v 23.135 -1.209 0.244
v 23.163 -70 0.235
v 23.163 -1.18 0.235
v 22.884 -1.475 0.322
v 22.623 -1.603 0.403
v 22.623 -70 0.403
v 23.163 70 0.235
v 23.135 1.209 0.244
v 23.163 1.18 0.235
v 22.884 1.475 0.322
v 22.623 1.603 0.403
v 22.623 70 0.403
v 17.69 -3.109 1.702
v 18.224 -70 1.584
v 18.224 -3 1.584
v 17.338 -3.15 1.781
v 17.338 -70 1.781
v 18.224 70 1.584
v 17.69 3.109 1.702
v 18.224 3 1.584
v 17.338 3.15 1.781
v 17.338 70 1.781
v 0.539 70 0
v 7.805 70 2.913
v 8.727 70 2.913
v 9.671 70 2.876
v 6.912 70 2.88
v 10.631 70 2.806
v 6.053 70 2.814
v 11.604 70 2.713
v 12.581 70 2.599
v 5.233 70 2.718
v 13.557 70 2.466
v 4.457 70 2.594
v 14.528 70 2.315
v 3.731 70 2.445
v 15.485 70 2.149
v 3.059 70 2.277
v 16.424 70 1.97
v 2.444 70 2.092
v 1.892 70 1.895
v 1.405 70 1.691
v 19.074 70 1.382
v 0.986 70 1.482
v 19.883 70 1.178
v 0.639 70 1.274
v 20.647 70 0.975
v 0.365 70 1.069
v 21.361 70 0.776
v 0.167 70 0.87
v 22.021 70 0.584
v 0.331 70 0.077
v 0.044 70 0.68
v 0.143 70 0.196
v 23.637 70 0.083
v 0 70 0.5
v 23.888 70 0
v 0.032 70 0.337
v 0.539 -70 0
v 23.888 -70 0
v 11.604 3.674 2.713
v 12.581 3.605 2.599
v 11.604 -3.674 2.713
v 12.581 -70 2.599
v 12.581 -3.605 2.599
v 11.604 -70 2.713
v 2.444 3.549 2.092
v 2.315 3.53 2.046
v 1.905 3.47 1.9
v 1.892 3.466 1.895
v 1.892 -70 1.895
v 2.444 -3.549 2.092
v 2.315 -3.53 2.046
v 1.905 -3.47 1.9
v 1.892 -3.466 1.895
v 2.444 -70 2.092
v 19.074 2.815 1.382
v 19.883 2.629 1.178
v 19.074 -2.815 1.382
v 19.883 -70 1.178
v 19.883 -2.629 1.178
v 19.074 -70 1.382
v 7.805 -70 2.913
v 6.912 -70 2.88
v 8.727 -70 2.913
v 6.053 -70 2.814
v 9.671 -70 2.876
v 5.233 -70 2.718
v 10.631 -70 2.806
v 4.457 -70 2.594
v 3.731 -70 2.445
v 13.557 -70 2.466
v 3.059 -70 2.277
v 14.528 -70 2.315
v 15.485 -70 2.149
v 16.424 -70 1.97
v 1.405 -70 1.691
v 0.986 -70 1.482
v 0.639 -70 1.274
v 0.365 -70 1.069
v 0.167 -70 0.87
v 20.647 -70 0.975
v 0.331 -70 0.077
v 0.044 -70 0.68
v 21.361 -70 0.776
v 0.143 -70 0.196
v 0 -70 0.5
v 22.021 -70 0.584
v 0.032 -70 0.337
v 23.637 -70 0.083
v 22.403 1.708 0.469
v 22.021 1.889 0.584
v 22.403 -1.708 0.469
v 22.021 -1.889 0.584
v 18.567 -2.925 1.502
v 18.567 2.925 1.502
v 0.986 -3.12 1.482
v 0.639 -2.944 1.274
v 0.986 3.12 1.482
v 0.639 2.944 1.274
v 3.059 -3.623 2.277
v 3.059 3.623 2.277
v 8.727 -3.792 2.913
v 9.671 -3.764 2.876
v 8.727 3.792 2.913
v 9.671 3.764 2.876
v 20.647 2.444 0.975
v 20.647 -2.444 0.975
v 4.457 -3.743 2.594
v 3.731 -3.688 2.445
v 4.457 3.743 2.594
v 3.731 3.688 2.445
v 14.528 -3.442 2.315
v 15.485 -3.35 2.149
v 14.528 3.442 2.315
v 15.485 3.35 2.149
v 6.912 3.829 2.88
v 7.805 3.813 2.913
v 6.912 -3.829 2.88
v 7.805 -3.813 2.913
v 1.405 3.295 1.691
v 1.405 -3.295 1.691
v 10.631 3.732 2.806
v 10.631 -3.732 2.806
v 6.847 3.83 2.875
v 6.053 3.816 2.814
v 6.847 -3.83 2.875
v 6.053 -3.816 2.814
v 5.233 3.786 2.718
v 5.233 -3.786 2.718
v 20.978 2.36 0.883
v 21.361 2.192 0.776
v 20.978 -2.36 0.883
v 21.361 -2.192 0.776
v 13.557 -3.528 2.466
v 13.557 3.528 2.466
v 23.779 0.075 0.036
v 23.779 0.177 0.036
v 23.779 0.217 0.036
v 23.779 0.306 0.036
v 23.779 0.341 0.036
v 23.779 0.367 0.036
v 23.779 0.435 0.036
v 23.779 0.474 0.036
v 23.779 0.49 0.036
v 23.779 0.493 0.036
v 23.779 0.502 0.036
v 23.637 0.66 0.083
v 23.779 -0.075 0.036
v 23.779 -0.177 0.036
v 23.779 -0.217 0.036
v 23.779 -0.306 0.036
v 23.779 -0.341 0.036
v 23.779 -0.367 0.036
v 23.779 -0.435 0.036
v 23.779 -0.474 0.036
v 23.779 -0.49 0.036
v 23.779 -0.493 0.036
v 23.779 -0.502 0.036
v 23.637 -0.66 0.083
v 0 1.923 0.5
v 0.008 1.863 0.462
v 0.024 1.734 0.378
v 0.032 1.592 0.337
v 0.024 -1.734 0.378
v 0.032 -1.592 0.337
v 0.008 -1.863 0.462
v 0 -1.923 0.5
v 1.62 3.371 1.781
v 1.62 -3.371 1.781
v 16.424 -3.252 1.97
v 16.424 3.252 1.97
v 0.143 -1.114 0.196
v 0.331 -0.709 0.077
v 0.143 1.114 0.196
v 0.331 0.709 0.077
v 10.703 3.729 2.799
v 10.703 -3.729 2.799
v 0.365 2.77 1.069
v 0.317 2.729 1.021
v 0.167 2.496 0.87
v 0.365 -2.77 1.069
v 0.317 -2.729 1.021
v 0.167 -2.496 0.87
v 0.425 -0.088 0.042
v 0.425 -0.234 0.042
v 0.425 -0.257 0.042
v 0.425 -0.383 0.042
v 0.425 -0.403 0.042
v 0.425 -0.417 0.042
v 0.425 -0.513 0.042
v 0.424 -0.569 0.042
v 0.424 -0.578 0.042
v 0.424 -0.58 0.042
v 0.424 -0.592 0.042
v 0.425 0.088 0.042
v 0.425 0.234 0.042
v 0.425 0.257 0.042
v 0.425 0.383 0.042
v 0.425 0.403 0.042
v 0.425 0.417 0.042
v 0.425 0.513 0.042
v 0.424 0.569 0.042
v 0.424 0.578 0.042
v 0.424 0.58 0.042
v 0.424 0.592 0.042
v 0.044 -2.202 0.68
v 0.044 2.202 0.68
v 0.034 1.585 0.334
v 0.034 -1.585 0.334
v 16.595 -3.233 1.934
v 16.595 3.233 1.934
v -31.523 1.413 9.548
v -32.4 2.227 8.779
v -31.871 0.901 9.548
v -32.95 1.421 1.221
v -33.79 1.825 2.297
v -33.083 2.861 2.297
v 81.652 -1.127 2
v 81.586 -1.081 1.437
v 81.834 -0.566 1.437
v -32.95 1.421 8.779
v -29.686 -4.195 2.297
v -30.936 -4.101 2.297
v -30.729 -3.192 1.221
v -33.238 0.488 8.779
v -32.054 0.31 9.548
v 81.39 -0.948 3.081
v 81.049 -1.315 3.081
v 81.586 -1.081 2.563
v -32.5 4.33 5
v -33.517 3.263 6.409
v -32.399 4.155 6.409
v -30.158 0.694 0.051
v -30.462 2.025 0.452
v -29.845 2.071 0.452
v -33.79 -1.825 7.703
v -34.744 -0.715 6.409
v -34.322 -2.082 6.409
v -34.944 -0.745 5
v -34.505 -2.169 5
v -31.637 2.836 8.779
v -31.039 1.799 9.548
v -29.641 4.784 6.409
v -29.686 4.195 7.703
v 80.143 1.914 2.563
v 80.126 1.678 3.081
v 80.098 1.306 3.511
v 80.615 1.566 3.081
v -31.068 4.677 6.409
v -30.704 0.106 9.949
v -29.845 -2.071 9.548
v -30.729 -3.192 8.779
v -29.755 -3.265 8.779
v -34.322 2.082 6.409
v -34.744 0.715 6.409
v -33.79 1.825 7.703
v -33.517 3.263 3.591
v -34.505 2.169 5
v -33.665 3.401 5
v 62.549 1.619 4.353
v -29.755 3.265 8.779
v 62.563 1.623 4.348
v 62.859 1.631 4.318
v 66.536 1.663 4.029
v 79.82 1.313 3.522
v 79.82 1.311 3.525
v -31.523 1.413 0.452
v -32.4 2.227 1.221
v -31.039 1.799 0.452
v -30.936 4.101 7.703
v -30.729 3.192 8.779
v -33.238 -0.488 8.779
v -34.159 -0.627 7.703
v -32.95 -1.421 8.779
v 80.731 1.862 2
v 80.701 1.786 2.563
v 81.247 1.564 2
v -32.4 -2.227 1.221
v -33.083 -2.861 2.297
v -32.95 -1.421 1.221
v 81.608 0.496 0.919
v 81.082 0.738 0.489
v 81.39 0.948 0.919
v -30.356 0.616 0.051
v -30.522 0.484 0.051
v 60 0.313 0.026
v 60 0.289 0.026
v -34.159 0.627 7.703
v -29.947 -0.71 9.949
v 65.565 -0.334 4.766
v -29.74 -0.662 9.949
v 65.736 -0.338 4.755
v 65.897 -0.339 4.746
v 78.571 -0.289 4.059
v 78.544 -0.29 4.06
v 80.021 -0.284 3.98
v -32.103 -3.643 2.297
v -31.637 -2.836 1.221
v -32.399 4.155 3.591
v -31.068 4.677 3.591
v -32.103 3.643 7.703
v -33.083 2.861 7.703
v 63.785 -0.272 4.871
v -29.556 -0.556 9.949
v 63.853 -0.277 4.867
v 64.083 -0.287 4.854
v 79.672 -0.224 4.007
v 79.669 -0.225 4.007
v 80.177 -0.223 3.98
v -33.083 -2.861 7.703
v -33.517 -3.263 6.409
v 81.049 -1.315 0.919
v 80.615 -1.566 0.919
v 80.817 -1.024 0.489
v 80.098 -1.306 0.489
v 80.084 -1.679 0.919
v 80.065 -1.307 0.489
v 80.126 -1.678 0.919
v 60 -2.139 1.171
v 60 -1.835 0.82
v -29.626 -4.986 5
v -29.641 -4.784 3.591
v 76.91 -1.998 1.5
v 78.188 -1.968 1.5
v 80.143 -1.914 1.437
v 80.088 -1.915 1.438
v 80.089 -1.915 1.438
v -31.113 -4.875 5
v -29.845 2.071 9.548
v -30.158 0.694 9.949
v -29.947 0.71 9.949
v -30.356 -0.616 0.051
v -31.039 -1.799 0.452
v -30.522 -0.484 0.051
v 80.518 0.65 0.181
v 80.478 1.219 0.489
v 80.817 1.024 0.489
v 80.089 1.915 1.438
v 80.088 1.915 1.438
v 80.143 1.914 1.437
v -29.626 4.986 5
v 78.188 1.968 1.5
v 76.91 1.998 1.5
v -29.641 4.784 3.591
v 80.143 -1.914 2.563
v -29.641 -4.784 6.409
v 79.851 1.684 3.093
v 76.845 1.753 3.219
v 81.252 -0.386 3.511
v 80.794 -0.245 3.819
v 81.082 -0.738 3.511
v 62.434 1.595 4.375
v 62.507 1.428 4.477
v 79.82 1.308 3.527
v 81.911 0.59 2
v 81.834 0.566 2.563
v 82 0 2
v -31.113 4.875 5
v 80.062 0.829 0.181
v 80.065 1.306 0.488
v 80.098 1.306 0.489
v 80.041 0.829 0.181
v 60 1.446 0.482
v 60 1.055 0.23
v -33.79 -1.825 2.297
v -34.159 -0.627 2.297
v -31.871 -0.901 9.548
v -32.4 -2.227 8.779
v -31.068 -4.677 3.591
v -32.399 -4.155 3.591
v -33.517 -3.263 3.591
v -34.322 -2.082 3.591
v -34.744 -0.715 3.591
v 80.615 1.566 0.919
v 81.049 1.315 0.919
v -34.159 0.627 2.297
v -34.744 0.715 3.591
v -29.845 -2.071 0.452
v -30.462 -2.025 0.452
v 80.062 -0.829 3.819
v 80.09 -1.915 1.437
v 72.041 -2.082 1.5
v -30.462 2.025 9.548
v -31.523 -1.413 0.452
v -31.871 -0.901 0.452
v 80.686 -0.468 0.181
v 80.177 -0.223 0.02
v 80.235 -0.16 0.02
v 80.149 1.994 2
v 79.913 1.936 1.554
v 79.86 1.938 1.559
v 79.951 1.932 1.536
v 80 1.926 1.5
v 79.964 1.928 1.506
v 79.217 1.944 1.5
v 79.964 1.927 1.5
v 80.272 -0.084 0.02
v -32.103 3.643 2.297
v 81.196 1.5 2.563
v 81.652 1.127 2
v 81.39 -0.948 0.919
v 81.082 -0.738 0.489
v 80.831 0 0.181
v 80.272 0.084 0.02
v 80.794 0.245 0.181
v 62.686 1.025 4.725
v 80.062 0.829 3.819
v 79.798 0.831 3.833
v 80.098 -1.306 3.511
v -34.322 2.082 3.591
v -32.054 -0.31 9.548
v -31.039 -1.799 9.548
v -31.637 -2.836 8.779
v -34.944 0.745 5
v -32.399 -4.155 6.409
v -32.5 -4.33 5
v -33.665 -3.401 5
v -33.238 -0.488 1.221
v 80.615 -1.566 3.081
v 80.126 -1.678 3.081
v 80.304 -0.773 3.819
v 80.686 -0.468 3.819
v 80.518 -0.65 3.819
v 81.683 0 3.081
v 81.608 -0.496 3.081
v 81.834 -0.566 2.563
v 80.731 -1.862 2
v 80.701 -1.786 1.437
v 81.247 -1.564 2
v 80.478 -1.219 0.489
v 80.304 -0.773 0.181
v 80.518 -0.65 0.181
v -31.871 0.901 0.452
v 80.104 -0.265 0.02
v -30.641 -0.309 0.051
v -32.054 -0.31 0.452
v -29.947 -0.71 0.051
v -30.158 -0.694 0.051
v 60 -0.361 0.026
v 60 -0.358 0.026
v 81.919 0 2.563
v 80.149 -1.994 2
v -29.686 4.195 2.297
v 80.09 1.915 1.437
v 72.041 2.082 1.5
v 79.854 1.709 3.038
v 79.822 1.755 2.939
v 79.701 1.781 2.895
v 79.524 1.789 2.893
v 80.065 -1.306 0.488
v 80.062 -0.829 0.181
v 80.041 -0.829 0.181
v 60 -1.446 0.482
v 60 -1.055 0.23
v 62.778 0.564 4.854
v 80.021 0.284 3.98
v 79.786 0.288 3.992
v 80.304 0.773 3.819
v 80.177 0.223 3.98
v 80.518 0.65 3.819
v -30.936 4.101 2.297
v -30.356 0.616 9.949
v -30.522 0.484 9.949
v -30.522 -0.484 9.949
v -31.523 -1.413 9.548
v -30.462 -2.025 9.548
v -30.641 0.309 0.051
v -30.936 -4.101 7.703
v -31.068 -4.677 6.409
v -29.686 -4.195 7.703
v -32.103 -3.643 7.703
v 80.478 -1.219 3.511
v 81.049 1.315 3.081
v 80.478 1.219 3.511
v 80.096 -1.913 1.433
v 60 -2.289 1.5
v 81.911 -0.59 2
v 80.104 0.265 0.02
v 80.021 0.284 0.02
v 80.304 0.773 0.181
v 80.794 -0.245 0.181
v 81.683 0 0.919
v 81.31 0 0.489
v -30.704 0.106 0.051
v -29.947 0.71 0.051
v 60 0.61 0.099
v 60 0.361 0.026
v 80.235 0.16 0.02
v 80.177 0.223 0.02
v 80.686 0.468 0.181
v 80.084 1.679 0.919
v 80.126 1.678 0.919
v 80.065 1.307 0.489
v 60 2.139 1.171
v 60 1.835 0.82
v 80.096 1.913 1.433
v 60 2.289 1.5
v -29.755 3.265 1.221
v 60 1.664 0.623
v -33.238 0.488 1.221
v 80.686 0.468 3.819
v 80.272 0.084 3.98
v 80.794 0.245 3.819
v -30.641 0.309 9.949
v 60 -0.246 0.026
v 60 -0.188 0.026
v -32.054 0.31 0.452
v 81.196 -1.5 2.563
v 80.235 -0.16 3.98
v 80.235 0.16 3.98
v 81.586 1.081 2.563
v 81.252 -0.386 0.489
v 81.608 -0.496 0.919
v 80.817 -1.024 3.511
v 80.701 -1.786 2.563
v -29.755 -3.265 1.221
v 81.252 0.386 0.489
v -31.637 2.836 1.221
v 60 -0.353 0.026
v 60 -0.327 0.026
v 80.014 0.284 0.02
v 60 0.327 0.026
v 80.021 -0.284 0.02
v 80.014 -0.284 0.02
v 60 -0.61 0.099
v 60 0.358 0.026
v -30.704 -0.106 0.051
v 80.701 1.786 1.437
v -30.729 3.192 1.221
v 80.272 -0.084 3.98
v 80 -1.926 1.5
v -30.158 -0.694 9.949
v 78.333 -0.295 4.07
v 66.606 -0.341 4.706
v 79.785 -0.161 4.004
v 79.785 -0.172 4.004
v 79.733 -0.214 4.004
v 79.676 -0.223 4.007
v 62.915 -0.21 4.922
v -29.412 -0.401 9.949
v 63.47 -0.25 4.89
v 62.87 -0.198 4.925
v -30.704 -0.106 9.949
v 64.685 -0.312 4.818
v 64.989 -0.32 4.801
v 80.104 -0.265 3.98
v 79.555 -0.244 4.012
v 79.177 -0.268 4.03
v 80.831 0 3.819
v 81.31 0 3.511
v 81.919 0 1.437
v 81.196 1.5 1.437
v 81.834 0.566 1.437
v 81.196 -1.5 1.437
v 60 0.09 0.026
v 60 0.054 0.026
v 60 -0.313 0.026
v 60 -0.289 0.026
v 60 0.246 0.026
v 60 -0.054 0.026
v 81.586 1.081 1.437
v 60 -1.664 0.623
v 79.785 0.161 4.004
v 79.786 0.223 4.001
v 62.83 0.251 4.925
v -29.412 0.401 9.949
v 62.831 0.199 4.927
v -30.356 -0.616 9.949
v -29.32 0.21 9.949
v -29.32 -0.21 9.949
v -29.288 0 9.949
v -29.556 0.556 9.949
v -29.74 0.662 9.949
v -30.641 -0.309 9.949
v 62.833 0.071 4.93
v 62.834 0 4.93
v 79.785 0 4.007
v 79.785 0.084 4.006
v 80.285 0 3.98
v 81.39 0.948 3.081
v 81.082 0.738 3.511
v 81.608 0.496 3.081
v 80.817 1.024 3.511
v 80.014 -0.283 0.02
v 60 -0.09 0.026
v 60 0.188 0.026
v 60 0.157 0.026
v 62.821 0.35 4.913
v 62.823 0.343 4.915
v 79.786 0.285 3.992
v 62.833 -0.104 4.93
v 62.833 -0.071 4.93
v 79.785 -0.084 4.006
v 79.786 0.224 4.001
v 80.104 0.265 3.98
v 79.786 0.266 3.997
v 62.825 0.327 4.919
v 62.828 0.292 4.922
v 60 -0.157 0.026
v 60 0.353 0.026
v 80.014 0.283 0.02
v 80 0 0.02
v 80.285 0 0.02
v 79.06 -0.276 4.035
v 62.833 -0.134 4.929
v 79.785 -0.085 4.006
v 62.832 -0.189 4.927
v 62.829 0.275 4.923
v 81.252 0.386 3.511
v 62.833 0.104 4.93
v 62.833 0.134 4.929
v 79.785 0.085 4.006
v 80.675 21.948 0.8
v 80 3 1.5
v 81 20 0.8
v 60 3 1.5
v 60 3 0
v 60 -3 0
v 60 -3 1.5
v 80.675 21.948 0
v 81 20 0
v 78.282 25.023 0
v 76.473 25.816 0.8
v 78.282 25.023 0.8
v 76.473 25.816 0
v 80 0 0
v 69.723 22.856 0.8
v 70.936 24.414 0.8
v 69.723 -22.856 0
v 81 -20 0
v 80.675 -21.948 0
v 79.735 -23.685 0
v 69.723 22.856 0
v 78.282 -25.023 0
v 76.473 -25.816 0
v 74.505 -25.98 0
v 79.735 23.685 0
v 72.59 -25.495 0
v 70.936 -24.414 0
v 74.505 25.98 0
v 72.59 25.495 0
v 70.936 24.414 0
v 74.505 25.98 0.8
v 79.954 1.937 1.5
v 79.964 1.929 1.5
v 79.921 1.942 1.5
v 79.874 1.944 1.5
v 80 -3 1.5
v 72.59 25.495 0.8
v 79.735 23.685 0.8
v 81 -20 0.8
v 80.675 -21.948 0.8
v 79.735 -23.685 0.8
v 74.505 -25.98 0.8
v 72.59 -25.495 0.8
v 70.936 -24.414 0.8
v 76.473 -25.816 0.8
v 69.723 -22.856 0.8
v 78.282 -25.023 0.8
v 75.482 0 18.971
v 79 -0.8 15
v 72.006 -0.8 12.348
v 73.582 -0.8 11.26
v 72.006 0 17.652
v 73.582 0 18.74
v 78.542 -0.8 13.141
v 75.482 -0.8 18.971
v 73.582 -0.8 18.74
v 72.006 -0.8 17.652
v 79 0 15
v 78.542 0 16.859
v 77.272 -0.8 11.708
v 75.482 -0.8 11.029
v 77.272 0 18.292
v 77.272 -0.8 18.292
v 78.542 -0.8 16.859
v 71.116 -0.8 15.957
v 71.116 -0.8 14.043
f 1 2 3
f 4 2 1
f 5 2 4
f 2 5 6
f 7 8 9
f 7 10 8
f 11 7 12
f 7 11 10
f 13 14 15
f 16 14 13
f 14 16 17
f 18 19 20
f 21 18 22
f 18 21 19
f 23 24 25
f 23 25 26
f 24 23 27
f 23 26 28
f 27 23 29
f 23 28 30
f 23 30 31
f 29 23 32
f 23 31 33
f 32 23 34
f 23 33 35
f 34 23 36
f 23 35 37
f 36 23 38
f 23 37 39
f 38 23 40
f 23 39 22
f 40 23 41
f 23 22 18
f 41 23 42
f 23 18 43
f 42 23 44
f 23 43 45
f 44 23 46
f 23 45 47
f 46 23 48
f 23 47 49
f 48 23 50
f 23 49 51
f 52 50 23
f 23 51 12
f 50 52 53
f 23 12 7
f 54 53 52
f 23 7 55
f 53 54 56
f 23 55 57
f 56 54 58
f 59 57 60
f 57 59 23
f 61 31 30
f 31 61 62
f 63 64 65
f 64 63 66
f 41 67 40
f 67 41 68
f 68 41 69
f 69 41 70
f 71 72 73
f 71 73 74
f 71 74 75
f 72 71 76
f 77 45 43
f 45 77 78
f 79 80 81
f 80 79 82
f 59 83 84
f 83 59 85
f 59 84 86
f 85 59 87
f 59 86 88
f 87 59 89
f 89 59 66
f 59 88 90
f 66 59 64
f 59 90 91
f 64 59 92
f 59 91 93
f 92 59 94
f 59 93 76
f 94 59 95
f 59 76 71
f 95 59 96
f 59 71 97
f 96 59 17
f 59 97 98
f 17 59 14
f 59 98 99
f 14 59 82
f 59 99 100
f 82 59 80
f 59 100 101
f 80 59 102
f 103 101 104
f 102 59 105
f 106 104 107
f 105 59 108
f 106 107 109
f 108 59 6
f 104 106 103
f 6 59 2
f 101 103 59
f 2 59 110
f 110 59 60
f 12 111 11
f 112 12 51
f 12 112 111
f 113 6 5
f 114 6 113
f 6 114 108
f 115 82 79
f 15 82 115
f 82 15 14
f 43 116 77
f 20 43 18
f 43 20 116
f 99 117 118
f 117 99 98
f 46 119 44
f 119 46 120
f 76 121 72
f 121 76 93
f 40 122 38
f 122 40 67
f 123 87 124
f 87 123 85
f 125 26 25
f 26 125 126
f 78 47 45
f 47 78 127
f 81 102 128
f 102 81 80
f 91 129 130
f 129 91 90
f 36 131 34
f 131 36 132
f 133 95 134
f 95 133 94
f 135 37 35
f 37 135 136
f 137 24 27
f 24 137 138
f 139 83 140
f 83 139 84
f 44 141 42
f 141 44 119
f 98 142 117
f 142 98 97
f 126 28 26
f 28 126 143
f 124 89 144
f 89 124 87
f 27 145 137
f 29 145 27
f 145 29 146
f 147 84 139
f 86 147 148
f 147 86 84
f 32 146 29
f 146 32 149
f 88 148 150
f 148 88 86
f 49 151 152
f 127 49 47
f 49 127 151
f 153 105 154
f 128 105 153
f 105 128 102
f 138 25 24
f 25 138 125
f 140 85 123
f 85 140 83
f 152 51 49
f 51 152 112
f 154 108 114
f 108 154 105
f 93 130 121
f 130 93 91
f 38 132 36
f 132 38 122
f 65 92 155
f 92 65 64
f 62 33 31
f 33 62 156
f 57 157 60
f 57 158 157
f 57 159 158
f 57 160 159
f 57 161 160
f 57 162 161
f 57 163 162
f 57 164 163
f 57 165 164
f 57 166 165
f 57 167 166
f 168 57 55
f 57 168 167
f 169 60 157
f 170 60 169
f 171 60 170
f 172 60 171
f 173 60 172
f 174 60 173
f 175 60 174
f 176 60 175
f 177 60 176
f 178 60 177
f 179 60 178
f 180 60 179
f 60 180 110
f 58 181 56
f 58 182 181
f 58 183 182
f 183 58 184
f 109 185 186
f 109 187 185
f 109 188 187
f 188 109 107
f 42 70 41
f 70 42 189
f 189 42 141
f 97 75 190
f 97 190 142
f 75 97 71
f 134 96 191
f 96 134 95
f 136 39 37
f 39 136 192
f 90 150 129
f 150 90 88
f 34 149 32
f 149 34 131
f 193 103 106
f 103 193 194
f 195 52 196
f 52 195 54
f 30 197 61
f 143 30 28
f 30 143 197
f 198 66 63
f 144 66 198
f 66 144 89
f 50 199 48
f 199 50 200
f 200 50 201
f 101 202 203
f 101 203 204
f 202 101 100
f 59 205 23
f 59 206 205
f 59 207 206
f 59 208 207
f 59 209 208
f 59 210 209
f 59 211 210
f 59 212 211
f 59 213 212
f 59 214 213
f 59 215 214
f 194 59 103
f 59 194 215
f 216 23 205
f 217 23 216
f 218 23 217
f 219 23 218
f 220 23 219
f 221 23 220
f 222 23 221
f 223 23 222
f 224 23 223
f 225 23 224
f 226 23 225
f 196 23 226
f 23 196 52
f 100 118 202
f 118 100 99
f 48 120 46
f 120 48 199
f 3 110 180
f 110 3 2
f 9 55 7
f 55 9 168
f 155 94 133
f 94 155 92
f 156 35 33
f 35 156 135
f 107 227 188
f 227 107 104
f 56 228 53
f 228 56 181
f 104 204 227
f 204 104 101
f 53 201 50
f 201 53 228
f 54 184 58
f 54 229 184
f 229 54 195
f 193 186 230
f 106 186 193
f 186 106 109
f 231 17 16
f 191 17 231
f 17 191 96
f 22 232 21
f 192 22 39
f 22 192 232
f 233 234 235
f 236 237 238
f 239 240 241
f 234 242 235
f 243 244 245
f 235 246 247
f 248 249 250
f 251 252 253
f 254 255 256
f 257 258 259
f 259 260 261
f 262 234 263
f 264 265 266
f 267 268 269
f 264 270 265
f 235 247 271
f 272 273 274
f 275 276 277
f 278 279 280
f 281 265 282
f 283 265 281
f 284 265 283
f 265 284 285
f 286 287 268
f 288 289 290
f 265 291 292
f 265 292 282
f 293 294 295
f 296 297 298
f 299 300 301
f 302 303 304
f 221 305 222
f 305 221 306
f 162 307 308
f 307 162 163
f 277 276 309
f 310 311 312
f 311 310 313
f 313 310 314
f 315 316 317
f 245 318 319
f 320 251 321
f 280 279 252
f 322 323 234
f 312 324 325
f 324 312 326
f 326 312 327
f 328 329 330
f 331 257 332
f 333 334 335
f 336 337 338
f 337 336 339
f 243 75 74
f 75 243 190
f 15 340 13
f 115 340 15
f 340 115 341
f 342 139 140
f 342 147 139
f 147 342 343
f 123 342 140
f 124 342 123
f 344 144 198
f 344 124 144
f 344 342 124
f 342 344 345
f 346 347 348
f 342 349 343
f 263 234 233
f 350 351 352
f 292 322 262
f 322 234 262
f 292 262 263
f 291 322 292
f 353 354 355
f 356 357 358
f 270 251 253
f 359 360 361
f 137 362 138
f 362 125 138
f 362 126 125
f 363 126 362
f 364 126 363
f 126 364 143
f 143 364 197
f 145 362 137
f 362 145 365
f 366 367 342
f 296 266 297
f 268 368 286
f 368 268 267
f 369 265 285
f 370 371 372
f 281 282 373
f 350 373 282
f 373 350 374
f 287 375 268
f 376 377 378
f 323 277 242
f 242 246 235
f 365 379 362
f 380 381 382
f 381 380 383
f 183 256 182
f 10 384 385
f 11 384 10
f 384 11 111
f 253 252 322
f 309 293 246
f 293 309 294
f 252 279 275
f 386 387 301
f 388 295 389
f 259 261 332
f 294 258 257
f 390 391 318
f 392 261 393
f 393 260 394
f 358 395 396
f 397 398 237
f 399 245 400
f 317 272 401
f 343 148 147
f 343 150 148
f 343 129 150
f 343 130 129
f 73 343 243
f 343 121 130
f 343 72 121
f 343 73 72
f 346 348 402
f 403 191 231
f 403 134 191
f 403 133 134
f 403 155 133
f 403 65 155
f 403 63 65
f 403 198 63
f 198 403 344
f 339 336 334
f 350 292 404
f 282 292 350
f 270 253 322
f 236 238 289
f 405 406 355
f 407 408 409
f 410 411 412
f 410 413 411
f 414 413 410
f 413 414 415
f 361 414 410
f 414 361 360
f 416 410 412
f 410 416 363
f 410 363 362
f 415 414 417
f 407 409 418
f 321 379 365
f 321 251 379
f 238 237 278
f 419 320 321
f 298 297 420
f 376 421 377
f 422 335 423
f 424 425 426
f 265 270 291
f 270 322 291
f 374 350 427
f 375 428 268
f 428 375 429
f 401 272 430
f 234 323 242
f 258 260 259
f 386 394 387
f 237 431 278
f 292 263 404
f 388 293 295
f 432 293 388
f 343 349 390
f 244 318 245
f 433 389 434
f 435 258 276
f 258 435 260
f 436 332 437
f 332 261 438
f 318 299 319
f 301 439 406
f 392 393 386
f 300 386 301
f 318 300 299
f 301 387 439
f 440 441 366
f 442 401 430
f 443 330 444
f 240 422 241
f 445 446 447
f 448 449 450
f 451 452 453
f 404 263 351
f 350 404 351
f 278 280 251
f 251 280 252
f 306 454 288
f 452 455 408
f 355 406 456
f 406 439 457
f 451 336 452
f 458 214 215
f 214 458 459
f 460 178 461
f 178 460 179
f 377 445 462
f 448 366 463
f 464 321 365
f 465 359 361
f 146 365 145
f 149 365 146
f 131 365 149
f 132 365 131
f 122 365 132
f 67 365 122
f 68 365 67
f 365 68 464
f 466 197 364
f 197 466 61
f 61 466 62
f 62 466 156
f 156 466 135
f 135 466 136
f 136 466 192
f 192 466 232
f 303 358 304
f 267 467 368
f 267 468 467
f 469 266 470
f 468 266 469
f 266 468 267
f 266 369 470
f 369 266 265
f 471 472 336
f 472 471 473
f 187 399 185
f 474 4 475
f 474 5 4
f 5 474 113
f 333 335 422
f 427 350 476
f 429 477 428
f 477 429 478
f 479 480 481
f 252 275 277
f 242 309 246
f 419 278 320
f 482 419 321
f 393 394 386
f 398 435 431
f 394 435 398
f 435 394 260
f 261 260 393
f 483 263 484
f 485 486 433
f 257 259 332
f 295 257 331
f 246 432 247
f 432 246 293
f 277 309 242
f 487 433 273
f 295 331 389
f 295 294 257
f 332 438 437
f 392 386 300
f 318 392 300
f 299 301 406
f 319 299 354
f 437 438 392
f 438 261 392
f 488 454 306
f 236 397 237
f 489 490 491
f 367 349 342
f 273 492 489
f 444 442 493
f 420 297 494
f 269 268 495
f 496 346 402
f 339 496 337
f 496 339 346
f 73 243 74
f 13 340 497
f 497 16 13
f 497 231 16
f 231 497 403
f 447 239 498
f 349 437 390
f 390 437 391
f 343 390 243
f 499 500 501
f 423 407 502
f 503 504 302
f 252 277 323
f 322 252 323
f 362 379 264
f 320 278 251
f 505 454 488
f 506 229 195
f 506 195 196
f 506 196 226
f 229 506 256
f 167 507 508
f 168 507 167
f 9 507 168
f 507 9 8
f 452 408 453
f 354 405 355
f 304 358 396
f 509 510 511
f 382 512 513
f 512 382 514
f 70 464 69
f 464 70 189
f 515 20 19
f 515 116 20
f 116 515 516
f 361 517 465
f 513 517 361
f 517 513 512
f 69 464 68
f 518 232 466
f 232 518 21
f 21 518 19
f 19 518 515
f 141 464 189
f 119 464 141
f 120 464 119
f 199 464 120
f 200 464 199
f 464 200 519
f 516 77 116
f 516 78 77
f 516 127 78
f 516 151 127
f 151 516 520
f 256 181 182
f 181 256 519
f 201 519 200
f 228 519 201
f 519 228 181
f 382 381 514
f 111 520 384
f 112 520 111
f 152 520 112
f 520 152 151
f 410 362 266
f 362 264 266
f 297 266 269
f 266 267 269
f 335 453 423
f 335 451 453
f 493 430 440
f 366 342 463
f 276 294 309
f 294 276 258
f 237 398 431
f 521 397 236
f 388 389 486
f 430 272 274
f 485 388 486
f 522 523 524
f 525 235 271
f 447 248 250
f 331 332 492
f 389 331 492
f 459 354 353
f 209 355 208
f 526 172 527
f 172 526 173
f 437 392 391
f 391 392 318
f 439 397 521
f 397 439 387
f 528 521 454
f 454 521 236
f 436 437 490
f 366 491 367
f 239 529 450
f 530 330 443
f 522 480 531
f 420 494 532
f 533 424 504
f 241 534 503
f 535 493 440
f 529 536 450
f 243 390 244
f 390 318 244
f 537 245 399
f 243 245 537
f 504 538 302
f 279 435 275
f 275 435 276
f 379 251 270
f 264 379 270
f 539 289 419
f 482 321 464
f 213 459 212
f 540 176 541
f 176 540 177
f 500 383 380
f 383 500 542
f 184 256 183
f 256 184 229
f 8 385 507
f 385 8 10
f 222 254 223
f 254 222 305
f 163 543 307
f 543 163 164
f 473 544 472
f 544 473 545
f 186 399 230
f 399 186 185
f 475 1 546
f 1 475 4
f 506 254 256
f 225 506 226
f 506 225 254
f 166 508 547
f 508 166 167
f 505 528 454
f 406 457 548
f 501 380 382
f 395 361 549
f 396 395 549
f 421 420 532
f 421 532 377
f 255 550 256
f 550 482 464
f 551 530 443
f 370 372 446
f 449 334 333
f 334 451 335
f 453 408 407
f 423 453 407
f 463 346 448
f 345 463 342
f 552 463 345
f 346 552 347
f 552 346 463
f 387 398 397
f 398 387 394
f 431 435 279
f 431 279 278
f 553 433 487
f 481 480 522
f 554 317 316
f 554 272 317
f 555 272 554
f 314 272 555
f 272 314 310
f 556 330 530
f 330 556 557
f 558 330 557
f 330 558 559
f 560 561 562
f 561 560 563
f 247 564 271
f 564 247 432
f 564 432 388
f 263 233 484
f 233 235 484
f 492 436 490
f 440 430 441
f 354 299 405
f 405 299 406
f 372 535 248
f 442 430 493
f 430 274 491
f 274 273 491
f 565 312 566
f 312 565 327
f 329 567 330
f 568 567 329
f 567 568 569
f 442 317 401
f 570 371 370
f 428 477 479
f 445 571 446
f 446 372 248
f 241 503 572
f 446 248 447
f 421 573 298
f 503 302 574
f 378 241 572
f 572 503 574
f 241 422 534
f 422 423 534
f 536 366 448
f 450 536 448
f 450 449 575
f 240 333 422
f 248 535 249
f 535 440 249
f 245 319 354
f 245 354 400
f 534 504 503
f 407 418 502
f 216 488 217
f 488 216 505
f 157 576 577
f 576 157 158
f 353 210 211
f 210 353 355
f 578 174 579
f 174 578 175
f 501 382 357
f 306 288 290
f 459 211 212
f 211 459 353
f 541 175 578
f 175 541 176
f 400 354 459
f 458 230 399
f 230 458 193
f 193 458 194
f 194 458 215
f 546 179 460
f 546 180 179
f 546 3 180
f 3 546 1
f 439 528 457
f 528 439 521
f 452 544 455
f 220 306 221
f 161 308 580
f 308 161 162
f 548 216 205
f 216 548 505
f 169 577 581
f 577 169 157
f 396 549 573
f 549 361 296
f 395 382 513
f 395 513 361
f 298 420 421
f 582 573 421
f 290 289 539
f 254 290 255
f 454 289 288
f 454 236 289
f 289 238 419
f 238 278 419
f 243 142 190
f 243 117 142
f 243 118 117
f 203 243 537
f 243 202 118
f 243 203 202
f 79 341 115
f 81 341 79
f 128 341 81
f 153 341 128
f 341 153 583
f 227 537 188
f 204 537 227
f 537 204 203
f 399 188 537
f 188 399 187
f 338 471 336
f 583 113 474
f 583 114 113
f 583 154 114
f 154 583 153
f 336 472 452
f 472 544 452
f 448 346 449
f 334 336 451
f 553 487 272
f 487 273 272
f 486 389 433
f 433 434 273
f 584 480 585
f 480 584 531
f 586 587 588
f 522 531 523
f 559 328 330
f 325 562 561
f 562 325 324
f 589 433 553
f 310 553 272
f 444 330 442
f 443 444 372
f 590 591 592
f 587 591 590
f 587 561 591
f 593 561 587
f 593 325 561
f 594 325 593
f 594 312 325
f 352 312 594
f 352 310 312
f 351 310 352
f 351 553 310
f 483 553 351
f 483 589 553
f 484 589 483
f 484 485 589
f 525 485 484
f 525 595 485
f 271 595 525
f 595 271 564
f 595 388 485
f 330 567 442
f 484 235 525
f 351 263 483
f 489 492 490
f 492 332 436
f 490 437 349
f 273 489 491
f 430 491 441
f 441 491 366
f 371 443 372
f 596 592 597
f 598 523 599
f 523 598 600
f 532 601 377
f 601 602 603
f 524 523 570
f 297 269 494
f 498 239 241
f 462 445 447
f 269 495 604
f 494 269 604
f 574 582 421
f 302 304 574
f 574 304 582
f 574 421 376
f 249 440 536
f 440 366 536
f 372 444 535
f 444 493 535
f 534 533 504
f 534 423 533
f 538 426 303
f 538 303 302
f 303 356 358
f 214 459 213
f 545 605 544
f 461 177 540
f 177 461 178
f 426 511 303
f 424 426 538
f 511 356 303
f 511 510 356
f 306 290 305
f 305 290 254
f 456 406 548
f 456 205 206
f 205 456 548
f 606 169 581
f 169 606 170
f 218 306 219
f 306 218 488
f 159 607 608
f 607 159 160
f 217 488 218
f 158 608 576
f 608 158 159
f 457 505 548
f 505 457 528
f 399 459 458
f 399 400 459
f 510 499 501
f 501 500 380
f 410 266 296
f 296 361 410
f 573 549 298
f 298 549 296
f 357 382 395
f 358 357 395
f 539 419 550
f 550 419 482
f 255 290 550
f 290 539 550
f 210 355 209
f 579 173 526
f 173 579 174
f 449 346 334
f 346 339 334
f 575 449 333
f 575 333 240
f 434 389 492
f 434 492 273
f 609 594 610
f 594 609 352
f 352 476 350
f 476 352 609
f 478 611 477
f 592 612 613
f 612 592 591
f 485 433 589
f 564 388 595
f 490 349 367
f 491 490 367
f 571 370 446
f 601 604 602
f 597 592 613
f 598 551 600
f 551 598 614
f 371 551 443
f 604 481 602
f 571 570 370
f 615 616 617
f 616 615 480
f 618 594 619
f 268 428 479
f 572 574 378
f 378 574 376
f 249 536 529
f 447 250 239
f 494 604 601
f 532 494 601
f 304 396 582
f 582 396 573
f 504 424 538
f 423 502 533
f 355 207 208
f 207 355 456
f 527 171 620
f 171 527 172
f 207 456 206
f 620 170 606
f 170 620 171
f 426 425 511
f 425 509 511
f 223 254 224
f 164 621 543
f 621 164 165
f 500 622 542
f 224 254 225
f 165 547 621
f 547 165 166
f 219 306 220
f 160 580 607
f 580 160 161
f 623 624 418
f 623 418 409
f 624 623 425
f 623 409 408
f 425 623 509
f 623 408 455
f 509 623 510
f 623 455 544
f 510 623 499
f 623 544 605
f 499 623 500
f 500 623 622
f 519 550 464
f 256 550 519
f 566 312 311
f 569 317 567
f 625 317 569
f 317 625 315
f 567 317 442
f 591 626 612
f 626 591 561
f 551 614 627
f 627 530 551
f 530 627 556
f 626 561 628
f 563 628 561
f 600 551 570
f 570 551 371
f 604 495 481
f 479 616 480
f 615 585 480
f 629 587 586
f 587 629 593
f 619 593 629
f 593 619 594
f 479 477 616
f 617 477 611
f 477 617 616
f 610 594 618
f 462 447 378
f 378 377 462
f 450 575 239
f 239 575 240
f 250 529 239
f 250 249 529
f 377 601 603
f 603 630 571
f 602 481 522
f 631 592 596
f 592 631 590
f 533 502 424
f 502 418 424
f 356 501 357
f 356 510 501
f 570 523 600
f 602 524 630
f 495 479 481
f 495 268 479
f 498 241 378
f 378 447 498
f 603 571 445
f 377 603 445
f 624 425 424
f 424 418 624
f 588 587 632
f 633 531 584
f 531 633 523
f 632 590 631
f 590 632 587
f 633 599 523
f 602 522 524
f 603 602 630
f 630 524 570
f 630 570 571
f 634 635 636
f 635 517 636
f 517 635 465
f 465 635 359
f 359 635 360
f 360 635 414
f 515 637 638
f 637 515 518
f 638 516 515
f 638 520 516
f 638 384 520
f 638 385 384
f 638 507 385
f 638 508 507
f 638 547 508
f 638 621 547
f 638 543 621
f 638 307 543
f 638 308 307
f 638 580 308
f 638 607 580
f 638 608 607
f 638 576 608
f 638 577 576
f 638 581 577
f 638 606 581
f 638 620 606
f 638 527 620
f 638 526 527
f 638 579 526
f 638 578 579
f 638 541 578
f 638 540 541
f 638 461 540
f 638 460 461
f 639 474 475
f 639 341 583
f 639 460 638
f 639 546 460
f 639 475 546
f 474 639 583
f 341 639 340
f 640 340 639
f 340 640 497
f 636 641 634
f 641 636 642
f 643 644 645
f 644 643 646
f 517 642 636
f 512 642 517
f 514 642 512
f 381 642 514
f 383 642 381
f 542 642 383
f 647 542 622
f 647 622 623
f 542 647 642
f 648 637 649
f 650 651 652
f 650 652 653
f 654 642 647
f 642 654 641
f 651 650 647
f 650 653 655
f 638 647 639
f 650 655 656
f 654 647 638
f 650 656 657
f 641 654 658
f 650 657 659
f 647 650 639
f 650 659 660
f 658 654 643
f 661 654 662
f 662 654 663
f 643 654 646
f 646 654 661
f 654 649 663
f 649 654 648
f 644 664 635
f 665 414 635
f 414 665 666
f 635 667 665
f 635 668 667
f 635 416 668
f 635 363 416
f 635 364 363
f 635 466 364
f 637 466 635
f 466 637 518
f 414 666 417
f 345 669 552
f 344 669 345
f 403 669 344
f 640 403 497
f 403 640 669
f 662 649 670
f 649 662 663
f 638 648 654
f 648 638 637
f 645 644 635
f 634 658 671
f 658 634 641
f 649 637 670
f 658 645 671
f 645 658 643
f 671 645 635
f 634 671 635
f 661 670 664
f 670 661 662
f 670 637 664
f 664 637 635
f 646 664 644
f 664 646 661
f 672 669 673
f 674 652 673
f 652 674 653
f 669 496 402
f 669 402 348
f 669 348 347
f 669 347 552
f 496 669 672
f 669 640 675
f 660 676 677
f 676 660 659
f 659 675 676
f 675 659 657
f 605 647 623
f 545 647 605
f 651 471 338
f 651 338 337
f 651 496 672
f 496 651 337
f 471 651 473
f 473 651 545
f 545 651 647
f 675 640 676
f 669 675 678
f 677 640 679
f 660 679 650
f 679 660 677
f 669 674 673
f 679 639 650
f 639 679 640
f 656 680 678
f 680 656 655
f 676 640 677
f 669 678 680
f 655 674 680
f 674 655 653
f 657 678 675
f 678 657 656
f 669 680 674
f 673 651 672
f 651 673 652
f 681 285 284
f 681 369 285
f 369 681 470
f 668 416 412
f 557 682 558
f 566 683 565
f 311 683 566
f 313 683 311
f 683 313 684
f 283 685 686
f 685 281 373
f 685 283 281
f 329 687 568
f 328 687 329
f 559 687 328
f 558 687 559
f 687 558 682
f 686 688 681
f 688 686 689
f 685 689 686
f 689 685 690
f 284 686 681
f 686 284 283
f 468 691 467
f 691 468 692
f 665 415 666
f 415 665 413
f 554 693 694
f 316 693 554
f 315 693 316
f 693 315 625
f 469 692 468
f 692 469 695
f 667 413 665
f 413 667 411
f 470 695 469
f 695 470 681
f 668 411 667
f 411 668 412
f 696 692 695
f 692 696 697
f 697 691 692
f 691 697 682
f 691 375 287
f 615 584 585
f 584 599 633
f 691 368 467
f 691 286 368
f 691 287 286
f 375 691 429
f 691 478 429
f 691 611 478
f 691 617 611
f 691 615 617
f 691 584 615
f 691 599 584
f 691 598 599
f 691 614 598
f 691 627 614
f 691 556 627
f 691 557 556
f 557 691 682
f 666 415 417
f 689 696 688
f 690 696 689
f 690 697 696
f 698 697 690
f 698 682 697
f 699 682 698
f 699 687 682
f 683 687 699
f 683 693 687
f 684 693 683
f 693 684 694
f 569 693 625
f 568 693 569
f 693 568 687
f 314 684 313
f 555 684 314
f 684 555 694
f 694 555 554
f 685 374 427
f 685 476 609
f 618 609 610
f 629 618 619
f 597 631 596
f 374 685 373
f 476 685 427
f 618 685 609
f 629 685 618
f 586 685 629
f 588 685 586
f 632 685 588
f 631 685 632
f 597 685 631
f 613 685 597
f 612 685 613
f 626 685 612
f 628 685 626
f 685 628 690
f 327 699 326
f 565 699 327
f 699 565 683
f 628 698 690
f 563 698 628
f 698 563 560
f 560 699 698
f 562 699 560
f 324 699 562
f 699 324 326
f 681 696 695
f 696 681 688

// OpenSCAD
/*
	Openscad glider.


*/

/* NACA 5412 Airfoil M=5.0% P=40.0% T=12.0% */

module airfoil(s) {
rotate([0,0,-2]) scale([s,s,s]) polygon(points=[
 [1.000000,-0.000000], [0.998459, 0.000480], [0.993844, 0.001912], [0.986185, 0.004266],
 [0.975528, 0.007497], [0.961940, 0.011541], [0.945503, 0.016321], [0.926320, 0.021747],
 [0.904508, 0.027720], [0.880203, 0.034131], [0.853553, 0.040868], [0.824724, 0.047815],
 [0.793893, 0.054856], [0.761249, 0.061875], [0.726995, 0.068760], [0.691342, 0.075399],
 [0.654508, 0.081690], [0.616723, 0.087531], [0.578217, 0.092831], [0.539230, 0.097504],
 [0.500000, 0.101473], [0.460770, 0.104671], [0.421783, 0.107042], [0.383277, 0.108495],
 [0.345492, 0.108628], [0.308658, 0.107381], [0.273005, 0.104801], [0.238751, 0.100962],
 [0.206107, 0.095964], [0.175276, 0.089926], [0.146447, 0.082992], [0.119797, 0.075318],
 [0.095492, 0.067072], [0.073680, 0.058429], [0.054497, 0.049563], [0.038060, 0.040642],
 [0.024472, 0.031824], [0.013815, 0.023248], [0.006156, 0.015030], [0.001541, 0.007261],
 [0.000000, 0.000000], [0.001541,-0.006492], [0.006156,-0.011976], [0.013815,-0.016460],
 [0.024472,-0.019963], [0.038060,-0.022517], [0.054497,-0.024170], [0.073680,-0.024982],
 [0.095492,-0.025026], [0.119797,-0.024389], [0.146447,-0.023173], [0.175276,-0.021490],
 [0.206107,-0.019460], [0.238751,-0.017213], [0.273005,-0.014881], [0.308658,-0.012596],
 [0.345492,-0.010485], [0.383277,-0.008670], [0.421783,-0.007174], [0.460770,-0.005697],
 [0.500000,-0.004250], [0.539230,-0.002888], [0.578217,-0.001653], [0.616723,-0.000578],
 [0.654508, 0.000317], [0.691342, 0.001023], [0.726995, 0.001539], [0.761249, 0.001875],
 [0.793893, 0.002047], [0.824724, 0.002077], [0.853553, 0.001991], [0.880203, 0.001815],
 [0.904508, 0.001578], [0.926320, 0.001305], [0.945503, 0.001019], [0.961940, 0.000743],
 [0.975528, 0.000494], [0.986185, 0.000286], [0.993844, 0.000130], [0.998459, 0.000033],
 [1.000000, 0.000000]]);
}

module flat_foil(s) {
  difference() {
    translate([0, 0.5]) airfoil(s);
    translate([0,-2]) square([s,2]);
  }
}
	
wingspan = 140;
tail_length = 60;
nose_length = 30;

module wing() {
  translate([0,0,0]) rotate([90,0,0]) linear_extrude(height=wingspan, center=true) flat_foil(25);
}

module fuselage() {
  hull() {
    translate([-nose_length,0,5]) sphere(r=5, $fn=21);
    translate([tail_length+20,0,2]) sphere(r=2, $fn=21);
  }
}

module stabilizer_right() {
  hull() {
    cube([20,3,1.5]);
    translate([15, 20, 0]) cylinder(r=6, h=0.8);
  }
}

module stabilizer_left() {
  mirror([0,1,0]) stabilizer_right();
}

module stabilizer_vert() {
  hull() {
    cube([20,2,1]);
    translate([15, 0, 15]) rotate([90,0,0]) cylinder(r=4, h=0.8);
  }
}

wing();
fuselage();
translate([tail_length,0,0]) stabilizer_right();
translate([tail_length,0,0]) stabilizer_left();
translate([tail_length,0,0]) stabilizer_vert();
